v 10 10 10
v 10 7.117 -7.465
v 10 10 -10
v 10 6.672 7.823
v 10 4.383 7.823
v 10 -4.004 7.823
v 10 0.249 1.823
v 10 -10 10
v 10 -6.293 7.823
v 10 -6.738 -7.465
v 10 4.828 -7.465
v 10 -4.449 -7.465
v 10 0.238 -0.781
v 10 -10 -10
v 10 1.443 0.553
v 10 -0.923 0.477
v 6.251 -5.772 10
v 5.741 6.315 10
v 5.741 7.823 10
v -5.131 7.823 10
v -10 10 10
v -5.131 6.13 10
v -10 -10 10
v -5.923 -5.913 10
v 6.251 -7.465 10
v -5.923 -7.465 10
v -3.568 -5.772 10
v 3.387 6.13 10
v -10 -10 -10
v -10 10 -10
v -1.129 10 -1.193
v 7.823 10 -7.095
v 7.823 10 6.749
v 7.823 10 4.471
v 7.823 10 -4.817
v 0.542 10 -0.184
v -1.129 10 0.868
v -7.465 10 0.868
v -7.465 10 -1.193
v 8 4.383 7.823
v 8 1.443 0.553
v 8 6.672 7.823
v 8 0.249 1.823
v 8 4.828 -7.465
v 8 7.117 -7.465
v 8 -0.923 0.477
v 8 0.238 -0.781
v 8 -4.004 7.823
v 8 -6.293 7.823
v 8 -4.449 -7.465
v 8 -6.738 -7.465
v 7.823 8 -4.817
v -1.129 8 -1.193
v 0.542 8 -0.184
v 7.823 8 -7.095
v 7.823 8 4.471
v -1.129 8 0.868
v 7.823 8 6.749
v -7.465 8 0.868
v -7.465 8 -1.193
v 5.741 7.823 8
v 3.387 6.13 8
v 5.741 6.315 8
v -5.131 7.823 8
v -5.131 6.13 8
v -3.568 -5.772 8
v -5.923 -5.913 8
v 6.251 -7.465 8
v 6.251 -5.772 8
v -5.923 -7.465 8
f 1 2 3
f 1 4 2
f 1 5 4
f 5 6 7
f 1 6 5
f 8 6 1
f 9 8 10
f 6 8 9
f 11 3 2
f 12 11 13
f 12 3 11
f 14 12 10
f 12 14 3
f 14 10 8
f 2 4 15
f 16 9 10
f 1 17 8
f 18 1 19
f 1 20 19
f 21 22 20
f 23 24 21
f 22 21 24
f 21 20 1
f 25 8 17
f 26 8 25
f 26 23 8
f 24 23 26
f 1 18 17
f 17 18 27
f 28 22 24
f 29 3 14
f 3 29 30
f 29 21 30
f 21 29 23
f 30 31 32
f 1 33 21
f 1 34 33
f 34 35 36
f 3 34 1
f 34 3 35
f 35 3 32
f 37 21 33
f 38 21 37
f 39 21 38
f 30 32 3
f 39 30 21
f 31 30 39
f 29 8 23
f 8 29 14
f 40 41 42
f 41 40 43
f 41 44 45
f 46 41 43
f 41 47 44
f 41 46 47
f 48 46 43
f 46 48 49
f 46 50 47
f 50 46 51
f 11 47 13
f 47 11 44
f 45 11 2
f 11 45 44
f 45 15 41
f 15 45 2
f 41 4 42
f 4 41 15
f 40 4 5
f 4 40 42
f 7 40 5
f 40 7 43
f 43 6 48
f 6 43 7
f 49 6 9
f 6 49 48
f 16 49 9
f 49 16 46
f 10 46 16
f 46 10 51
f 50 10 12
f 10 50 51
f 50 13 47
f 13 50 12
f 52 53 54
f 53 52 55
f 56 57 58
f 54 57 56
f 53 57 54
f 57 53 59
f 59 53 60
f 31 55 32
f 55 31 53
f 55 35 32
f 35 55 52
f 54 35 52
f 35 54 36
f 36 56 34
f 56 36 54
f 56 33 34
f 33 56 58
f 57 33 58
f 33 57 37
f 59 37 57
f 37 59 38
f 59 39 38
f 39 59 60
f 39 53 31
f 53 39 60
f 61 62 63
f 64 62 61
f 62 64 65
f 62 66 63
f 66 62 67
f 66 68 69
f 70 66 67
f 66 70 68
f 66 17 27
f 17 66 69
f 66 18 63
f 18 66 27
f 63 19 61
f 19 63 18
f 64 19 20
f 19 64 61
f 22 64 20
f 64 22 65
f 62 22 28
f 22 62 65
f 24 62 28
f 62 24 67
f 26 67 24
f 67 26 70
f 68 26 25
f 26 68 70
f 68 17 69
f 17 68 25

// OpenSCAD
// cube side length
side=20;
// font size percentage
ptext=side*0.8;
// letters depth
depth=2;

cube_xyz(side,ptext,depth);

module cube_xyz(i_side,i_ptext,i_depth) {
	insurance=0.1;
	
	difference() {
		cube(i_side,true);
		
		translate([(i_side/2)-i_depth,0,0]) rotate(a=[90,0,90]) linear_extrude(i_depth+insurance) text("X",size=i_ptext,halign="center",valign="center");
		
		translate([0,((i_side/2)+insurance),0]) rotate(a=[90,90,0]) linear_extrude(i_depth+insurance) text("Y",size=i_ptext,halign="center",valign="center");
		
		translate([0,0,(i_side/2)-i_depth]) linear_extrude(i_depth+insurance) text("Z",size=i_ptext,halign="center",valign="center");
	}
}
